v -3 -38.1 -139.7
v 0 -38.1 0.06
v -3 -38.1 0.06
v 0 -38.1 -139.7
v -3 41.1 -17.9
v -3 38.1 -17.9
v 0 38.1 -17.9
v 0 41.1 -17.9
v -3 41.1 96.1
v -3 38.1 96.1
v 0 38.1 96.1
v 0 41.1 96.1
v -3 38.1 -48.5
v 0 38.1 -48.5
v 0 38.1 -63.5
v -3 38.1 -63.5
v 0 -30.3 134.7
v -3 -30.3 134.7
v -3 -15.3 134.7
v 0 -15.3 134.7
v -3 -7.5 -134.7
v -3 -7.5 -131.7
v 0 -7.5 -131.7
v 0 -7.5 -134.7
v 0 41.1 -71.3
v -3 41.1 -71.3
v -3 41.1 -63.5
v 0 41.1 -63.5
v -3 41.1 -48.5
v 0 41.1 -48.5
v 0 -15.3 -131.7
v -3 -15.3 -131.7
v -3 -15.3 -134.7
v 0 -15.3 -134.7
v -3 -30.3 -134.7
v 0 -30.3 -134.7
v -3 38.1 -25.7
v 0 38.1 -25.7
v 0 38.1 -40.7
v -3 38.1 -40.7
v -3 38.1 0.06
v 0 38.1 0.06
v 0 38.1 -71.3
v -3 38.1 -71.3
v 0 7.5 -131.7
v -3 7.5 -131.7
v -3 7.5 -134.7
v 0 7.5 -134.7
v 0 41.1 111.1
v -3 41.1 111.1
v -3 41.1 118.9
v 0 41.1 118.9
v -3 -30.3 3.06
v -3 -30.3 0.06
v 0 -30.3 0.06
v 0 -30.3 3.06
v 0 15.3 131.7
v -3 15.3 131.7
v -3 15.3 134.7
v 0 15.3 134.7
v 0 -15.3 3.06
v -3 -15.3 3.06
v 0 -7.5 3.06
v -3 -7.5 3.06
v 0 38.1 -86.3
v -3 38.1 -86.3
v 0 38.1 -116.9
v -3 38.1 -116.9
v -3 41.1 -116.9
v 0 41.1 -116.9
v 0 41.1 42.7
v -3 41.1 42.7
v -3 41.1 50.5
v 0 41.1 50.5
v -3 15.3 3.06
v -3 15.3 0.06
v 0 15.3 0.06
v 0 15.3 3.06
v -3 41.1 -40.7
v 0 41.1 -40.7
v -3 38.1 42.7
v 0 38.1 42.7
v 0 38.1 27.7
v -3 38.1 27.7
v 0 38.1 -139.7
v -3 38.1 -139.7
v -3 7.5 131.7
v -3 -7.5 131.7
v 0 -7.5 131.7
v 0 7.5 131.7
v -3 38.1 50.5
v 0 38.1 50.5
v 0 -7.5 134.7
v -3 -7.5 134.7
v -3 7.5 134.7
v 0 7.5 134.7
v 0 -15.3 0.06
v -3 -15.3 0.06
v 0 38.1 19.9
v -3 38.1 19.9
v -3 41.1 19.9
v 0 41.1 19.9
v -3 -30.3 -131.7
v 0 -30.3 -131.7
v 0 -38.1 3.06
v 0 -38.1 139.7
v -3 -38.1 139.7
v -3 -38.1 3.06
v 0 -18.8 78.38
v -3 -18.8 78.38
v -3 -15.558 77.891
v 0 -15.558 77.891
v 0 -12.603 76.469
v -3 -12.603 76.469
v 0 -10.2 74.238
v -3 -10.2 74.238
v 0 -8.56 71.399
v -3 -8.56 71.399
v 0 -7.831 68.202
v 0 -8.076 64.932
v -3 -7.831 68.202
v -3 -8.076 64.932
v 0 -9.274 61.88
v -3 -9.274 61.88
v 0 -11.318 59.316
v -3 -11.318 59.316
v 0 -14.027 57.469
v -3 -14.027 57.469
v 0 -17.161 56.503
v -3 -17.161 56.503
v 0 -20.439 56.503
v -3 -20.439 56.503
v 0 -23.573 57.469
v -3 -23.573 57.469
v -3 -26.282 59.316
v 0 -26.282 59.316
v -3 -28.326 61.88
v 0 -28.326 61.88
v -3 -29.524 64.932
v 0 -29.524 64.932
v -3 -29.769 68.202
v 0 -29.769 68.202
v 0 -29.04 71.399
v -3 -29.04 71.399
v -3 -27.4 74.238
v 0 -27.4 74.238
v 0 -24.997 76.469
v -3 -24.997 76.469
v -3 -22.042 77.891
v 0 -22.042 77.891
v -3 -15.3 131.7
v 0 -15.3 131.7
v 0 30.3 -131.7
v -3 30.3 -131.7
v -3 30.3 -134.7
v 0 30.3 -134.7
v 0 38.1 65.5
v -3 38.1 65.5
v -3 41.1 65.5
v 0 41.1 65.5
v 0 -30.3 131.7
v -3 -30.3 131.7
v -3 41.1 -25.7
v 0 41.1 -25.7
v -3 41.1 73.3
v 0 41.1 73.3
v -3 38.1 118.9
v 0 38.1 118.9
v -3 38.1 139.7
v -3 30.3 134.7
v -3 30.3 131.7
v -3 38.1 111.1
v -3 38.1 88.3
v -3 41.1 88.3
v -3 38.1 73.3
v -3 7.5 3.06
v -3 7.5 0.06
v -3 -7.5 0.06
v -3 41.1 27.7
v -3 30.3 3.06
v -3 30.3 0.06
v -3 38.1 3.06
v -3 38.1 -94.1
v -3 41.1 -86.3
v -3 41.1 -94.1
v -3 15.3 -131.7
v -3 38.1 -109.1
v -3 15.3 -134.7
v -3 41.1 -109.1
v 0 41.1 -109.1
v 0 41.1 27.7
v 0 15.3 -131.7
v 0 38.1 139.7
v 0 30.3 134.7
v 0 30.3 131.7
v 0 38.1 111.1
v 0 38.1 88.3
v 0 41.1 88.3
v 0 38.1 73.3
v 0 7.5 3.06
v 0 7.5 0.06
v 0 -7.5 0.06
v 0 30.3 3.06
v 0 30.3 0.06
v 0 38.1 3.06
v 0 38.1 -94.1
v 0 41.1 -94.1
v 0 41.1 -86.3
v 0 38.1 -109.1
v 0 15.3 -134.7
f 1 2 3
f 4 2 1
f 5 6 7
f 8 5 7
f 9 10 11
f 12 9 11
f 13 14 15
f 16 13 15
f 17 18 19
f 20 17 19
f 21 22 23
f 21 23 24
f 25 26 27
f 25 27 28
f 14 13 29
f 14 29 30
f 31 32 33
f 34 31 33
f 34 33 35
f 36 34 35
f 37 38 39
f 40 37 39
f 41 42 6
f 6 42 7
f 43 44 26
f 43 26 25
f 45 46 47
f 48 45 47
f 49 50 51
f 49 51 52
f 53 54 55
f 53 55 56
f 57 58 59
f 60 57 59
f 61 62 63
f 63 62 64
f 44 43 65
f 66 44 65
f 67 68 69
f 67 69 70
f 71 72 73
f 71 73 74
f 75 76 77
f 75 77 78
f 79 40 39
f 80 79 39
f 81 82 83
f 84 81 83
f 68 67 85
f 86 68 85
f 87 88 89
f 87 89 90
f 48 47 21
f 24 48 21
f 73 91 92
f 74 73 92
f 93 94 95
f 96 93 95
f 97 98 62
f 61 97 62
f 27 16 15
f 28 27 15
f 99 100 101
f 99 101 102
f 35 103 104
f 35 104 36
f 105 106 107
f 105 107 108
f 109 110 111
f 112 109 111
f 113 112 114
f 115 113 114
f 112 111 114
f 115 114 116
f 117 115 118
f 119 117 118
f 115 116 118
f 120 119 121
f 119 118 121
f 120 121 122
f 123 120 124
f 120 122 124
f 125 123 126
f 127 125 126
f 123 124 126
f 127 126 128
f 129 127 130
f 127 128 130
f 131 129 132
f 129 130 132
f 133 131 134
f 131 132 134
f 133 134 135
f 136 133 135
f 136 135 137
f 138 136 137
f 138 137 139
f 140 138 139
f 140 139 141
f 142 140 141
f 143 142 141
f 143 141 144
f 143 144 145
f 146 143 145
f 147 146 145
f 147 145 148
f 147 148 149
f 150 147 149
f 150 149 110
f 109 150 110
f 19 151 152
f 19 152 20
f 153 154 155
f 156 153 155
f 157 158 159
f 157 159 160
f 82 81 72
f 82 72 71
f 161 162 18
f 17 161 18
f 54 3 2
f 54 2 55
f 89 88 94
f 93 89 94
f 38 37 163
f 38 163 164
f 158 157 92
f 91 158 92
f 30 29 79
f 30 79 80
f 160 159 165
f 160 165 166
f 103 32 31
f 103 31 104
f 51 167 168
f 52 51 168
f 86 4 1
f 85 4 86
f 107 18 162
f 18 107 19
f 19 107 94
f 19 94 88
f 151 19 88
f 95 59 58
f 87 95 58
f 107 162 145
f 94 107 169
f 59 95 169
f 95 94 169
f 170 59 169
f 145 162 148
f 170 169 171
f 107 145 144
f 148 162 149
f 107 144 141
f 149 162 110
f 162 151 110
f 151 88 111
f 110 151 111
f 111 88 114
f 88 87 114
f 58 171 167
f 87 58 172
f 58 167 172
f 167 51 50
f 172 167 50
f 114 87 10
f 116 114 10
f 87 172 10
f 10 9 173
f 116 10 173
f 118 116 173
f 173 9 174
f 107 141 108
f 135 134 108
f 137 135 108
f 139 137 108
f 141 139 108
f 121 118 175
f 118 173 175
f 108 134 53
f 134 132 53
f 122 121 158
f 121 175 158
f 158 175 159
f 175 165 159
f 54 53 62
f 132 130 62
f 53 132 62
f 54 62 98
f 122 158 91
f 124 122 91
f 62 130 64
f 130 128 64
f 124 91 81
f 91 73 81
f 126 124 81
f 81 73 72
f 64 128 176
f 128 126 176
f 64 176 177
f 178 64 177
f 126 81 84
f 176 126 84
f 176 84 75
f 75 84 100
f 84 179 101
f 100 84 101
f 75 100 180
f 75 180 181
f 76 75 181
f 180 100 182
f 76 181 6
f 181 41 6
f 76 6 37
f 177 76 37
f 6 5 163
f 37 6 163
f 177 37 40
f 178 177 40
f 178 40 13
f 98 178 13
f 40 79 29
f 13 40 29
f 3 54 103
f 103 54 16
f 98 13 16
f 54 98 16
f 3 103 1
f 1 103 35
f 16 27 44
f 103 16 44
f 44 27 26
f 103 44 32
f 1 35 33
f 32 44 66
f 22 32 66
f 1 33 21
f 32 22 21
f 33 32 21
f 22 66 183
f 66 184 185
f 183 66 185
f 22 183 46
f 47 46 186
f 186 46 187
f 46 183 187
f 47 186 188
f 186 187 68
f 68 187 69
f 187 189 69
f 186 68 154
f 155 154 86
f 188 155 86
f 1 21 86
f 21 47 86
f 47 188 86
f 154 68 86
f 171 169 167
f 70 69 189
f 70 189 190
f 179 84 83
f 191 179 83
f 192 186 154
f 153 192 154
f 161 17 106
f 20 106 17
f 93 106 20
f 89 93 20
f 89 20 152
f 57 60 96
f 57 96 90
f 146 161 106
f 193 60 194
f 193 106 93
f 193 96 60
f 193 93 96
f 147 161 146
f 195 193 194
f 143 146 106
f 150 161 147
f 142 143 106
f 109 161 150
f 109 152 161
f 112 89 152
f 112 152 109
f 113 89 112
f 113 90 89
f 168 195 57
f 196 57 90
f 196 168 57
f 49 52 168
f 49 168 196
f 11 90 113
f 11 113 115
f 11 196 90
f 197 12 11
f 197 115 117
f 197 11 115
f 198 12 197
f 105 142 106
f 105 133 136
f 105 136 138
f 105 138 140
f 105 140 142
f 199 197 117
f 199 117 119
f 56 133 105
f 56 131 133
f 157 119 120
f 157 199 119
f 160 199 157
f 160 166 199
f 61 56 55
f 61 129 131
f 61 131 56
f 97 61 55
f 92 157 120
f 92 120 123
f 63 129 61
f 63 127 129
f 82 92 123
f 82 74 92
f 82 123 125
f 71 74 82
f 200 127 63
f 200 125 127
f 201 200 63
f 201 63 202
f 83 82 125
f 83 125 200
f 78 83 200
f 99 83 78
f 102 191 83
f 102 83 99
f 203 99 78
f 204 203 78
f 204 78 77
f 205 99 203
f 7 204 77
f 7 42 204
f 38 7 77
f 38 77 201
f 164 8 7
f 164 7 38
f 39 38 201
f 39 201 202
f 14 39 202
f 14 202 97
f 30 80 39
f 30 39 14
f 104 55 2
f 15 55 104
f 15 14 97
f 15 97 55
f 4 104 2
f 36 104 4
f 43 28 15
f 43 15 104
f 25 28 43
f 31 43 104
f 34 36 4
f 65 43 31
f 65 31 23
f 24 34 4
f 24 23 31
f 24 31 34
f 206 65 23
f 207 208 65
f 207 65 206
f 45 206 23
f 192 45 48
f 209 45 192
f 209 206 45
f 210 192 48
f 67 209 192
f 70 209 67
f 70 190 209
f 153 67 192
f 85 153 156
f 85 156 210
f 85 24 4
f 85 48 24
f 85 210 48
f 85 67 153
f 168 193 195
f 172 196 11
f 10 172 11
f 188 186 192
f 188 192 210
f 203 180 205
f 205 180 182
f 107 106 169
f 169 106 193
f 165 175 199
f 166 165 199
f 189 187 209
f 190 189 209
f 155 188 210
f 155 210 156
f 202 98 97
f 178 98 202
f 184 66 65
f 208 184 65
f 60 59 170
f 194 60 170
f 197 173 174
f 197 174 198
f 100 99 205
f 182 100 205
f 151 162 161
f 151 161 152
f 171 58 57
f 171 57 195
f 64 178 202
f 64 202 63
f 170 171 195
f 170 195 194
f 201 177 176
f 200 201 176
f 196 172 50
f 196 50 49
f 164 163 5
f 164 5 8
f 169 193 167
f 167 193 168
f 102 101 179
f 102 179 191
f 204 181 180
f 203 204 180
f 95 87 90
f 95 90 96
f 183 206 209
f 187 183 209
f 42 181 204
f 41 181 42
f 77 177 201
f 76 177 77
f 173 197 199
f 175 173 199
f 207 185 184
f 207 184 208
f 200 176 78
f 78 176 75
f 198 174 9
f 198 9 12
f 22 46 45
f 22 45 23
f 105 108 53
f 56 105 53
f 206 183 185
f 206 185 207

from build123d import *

# Parameters (mm, degrees)
SKETCH1_W               = 279.4
SKETCH1_H               = 76.2
BOSS_EXTRUDE1_DEPTH     = 3
SKETCH3_W               = 3
SKETCH3_H               = 15
CUT_EXTRUDE1_DEPTH      = 145.833352512
LPATTERN1_COUNT         = 3
LPATTERN1_PITCH         = 22.8
MIRROR1_COPY_1_SKETCH_W = 3
MIRROR1_COPY_1_SKETCH_H = 15
MIRROR1_COPY_1_DEPTH    = 145.833352512
MIRROR1_COPY_2_SKETCH_W = 3
MIRROR1_COPY_2_SKETCH_H = 15
MIRROR1_COPY_2_DEPTH    = 145.833352512
SKETCH6_W               = 3
SKETCH6_H               = 7.8
CUT_EXTRUDE2_DEPTH      = 145.833352512
LPATTERN2_COUNT         = 4
LPATTERN2_PITCH         = 22.8
SKETCH8_W               = 3
SKETCH8_H               = 7.8
BOSS_EXTRUDE2_DEPTH     = 3
LPATTERN4_COUNT         = 11
LPATTERN4_PITCH         = 22.8
SKETCH9_R               = 11
CUT_EXTRUDE3_DEPTH      = 146.651295909


with BuildPart() as part:
    # Sketch1 → Boss-Extrude1 (new body)
    with BuildSketch(Plane(origin=(0, 0, 0), x_dir=(0, 0, -1), z_dir=(1, 0, 0))):
        Rectangle(SKETCH1_W, SKETCH1_H)
    extrude(amount=-BOSS_EXTRUDE1_DEPTH)

    # Sketch3 → Cut-Extrude1 (cut, through all)
    with BuildSketch(Plane.ZY.offset(3)):
        with Locations((133.2, 22.8)):
            Rectangle(SKETCH3_W, SKETCH3_H)
    cut_extrude1 = extrude(amount=-CUT_EXTRUDE1_DEPTH, mode=Mode.SUBTRACT)

    # LPattern1: Cut-Extrude1 ×3
    with Locations(*[(0, -i * LPATTERN1_PITCH, 0) for i in range(1, LPATTERN1_COUNT)]):
        add(cut_extrude1, mode=Mode.SUBTRACT)

    # Mirror1: Cut-Extrude1 across plane
    add(cut_extrude1.mirror(Plane.XY), mode=Mode.SUBTRACT)

    # Mirror1 copy 1 sketch → Mirror1 copy 1 (cut, through all)
    with BuildSketch(Plane(origin=(-3, -22.8, 0), x_dir=(0, 0, -1), z_dir=(-1, 0, 0))):
        with Locations((133.2, -22.8)):
            Rectangle(MIRROR1_COPY_1_SKETCH_W, MIRROR1_COPY_1_SKETCH_H)
    extrude(amount=-MIRROR1_COPY_1_DEPTH, mode=Mode.SUBTRACT)

    # Mirror1 copy 2 sketch → Mirror1 copy 2 (cut, through all)
    with BuildSketch(Plane(origin=(-3, -45.6, 0), x_dir=(0, 0, -1), z_dir=(-1, 0, 0))):
        with Locations((133.2, -22.8)):
            Rectangle(MIRROR1_COPY_2_SKETCH_W, MIRROR1_COPY_2_SKETCH_H)
    extrude(amount=-MIRROR1_COPY_2_DEPTH, mode=Mode.SUBTRACT)

    # Sketch6 → Cut-Extrude2 (cut, through all)
    with BuildSketch(Plane.ZY.offset(3)):
        with Locations((1.56, 34.2)):
            Rectangle(SKETCH6_W, SKETCH6_H)
    cut_extrude2 = extrude(amount=-CUT_EXTRUDE2_DEPTH, mode=Mode.SUBTRACT)

    # LPattern2: Cut-Extrude2 ×4
    with Locations(*[(0, -i * LPATTERN2_PITCH, 0) for i in range(1, LPATTERN2_COUNT)]):
        add(cut_extrude2, mode=Mode.SUBTRACT)

    # Sketch8 → Boss-Extrude2 (add)
    with BuildSketch(Plane(origin=(0, 38.1, 0), x_dir=(1, 0, 0), z_dir=(0, 1, 0))):
        with Locations((-1.5, 113)):
            Rectangle(SKETCH8_W, SKETCH8_H)
    boss_extrude2 = extrude(amount=BOSS_EXTRUDE2_DEPTH)

    # LPattern4: Boss-Extrude2 ×11, 1 skipped
    with Locations(*[(0, 0, i * LPATTERN4_PITCH) for i in range(1, LPATTERN4_COUNT) if i not in (5,)]):
        add(boss_extrude2)

    # Sketch9 → Cut-Extrude3 (cut, through all)
    with BuildSketch(Plane.ZY.offset(3)):
        with Locations((67.38, -18.8)):
            Circle(SKETCH9_R)
    extrude(amount=-CUT_EXTRUDE3_DEPTH, mode=Mode.SUBTRACT)


solid = part.part
